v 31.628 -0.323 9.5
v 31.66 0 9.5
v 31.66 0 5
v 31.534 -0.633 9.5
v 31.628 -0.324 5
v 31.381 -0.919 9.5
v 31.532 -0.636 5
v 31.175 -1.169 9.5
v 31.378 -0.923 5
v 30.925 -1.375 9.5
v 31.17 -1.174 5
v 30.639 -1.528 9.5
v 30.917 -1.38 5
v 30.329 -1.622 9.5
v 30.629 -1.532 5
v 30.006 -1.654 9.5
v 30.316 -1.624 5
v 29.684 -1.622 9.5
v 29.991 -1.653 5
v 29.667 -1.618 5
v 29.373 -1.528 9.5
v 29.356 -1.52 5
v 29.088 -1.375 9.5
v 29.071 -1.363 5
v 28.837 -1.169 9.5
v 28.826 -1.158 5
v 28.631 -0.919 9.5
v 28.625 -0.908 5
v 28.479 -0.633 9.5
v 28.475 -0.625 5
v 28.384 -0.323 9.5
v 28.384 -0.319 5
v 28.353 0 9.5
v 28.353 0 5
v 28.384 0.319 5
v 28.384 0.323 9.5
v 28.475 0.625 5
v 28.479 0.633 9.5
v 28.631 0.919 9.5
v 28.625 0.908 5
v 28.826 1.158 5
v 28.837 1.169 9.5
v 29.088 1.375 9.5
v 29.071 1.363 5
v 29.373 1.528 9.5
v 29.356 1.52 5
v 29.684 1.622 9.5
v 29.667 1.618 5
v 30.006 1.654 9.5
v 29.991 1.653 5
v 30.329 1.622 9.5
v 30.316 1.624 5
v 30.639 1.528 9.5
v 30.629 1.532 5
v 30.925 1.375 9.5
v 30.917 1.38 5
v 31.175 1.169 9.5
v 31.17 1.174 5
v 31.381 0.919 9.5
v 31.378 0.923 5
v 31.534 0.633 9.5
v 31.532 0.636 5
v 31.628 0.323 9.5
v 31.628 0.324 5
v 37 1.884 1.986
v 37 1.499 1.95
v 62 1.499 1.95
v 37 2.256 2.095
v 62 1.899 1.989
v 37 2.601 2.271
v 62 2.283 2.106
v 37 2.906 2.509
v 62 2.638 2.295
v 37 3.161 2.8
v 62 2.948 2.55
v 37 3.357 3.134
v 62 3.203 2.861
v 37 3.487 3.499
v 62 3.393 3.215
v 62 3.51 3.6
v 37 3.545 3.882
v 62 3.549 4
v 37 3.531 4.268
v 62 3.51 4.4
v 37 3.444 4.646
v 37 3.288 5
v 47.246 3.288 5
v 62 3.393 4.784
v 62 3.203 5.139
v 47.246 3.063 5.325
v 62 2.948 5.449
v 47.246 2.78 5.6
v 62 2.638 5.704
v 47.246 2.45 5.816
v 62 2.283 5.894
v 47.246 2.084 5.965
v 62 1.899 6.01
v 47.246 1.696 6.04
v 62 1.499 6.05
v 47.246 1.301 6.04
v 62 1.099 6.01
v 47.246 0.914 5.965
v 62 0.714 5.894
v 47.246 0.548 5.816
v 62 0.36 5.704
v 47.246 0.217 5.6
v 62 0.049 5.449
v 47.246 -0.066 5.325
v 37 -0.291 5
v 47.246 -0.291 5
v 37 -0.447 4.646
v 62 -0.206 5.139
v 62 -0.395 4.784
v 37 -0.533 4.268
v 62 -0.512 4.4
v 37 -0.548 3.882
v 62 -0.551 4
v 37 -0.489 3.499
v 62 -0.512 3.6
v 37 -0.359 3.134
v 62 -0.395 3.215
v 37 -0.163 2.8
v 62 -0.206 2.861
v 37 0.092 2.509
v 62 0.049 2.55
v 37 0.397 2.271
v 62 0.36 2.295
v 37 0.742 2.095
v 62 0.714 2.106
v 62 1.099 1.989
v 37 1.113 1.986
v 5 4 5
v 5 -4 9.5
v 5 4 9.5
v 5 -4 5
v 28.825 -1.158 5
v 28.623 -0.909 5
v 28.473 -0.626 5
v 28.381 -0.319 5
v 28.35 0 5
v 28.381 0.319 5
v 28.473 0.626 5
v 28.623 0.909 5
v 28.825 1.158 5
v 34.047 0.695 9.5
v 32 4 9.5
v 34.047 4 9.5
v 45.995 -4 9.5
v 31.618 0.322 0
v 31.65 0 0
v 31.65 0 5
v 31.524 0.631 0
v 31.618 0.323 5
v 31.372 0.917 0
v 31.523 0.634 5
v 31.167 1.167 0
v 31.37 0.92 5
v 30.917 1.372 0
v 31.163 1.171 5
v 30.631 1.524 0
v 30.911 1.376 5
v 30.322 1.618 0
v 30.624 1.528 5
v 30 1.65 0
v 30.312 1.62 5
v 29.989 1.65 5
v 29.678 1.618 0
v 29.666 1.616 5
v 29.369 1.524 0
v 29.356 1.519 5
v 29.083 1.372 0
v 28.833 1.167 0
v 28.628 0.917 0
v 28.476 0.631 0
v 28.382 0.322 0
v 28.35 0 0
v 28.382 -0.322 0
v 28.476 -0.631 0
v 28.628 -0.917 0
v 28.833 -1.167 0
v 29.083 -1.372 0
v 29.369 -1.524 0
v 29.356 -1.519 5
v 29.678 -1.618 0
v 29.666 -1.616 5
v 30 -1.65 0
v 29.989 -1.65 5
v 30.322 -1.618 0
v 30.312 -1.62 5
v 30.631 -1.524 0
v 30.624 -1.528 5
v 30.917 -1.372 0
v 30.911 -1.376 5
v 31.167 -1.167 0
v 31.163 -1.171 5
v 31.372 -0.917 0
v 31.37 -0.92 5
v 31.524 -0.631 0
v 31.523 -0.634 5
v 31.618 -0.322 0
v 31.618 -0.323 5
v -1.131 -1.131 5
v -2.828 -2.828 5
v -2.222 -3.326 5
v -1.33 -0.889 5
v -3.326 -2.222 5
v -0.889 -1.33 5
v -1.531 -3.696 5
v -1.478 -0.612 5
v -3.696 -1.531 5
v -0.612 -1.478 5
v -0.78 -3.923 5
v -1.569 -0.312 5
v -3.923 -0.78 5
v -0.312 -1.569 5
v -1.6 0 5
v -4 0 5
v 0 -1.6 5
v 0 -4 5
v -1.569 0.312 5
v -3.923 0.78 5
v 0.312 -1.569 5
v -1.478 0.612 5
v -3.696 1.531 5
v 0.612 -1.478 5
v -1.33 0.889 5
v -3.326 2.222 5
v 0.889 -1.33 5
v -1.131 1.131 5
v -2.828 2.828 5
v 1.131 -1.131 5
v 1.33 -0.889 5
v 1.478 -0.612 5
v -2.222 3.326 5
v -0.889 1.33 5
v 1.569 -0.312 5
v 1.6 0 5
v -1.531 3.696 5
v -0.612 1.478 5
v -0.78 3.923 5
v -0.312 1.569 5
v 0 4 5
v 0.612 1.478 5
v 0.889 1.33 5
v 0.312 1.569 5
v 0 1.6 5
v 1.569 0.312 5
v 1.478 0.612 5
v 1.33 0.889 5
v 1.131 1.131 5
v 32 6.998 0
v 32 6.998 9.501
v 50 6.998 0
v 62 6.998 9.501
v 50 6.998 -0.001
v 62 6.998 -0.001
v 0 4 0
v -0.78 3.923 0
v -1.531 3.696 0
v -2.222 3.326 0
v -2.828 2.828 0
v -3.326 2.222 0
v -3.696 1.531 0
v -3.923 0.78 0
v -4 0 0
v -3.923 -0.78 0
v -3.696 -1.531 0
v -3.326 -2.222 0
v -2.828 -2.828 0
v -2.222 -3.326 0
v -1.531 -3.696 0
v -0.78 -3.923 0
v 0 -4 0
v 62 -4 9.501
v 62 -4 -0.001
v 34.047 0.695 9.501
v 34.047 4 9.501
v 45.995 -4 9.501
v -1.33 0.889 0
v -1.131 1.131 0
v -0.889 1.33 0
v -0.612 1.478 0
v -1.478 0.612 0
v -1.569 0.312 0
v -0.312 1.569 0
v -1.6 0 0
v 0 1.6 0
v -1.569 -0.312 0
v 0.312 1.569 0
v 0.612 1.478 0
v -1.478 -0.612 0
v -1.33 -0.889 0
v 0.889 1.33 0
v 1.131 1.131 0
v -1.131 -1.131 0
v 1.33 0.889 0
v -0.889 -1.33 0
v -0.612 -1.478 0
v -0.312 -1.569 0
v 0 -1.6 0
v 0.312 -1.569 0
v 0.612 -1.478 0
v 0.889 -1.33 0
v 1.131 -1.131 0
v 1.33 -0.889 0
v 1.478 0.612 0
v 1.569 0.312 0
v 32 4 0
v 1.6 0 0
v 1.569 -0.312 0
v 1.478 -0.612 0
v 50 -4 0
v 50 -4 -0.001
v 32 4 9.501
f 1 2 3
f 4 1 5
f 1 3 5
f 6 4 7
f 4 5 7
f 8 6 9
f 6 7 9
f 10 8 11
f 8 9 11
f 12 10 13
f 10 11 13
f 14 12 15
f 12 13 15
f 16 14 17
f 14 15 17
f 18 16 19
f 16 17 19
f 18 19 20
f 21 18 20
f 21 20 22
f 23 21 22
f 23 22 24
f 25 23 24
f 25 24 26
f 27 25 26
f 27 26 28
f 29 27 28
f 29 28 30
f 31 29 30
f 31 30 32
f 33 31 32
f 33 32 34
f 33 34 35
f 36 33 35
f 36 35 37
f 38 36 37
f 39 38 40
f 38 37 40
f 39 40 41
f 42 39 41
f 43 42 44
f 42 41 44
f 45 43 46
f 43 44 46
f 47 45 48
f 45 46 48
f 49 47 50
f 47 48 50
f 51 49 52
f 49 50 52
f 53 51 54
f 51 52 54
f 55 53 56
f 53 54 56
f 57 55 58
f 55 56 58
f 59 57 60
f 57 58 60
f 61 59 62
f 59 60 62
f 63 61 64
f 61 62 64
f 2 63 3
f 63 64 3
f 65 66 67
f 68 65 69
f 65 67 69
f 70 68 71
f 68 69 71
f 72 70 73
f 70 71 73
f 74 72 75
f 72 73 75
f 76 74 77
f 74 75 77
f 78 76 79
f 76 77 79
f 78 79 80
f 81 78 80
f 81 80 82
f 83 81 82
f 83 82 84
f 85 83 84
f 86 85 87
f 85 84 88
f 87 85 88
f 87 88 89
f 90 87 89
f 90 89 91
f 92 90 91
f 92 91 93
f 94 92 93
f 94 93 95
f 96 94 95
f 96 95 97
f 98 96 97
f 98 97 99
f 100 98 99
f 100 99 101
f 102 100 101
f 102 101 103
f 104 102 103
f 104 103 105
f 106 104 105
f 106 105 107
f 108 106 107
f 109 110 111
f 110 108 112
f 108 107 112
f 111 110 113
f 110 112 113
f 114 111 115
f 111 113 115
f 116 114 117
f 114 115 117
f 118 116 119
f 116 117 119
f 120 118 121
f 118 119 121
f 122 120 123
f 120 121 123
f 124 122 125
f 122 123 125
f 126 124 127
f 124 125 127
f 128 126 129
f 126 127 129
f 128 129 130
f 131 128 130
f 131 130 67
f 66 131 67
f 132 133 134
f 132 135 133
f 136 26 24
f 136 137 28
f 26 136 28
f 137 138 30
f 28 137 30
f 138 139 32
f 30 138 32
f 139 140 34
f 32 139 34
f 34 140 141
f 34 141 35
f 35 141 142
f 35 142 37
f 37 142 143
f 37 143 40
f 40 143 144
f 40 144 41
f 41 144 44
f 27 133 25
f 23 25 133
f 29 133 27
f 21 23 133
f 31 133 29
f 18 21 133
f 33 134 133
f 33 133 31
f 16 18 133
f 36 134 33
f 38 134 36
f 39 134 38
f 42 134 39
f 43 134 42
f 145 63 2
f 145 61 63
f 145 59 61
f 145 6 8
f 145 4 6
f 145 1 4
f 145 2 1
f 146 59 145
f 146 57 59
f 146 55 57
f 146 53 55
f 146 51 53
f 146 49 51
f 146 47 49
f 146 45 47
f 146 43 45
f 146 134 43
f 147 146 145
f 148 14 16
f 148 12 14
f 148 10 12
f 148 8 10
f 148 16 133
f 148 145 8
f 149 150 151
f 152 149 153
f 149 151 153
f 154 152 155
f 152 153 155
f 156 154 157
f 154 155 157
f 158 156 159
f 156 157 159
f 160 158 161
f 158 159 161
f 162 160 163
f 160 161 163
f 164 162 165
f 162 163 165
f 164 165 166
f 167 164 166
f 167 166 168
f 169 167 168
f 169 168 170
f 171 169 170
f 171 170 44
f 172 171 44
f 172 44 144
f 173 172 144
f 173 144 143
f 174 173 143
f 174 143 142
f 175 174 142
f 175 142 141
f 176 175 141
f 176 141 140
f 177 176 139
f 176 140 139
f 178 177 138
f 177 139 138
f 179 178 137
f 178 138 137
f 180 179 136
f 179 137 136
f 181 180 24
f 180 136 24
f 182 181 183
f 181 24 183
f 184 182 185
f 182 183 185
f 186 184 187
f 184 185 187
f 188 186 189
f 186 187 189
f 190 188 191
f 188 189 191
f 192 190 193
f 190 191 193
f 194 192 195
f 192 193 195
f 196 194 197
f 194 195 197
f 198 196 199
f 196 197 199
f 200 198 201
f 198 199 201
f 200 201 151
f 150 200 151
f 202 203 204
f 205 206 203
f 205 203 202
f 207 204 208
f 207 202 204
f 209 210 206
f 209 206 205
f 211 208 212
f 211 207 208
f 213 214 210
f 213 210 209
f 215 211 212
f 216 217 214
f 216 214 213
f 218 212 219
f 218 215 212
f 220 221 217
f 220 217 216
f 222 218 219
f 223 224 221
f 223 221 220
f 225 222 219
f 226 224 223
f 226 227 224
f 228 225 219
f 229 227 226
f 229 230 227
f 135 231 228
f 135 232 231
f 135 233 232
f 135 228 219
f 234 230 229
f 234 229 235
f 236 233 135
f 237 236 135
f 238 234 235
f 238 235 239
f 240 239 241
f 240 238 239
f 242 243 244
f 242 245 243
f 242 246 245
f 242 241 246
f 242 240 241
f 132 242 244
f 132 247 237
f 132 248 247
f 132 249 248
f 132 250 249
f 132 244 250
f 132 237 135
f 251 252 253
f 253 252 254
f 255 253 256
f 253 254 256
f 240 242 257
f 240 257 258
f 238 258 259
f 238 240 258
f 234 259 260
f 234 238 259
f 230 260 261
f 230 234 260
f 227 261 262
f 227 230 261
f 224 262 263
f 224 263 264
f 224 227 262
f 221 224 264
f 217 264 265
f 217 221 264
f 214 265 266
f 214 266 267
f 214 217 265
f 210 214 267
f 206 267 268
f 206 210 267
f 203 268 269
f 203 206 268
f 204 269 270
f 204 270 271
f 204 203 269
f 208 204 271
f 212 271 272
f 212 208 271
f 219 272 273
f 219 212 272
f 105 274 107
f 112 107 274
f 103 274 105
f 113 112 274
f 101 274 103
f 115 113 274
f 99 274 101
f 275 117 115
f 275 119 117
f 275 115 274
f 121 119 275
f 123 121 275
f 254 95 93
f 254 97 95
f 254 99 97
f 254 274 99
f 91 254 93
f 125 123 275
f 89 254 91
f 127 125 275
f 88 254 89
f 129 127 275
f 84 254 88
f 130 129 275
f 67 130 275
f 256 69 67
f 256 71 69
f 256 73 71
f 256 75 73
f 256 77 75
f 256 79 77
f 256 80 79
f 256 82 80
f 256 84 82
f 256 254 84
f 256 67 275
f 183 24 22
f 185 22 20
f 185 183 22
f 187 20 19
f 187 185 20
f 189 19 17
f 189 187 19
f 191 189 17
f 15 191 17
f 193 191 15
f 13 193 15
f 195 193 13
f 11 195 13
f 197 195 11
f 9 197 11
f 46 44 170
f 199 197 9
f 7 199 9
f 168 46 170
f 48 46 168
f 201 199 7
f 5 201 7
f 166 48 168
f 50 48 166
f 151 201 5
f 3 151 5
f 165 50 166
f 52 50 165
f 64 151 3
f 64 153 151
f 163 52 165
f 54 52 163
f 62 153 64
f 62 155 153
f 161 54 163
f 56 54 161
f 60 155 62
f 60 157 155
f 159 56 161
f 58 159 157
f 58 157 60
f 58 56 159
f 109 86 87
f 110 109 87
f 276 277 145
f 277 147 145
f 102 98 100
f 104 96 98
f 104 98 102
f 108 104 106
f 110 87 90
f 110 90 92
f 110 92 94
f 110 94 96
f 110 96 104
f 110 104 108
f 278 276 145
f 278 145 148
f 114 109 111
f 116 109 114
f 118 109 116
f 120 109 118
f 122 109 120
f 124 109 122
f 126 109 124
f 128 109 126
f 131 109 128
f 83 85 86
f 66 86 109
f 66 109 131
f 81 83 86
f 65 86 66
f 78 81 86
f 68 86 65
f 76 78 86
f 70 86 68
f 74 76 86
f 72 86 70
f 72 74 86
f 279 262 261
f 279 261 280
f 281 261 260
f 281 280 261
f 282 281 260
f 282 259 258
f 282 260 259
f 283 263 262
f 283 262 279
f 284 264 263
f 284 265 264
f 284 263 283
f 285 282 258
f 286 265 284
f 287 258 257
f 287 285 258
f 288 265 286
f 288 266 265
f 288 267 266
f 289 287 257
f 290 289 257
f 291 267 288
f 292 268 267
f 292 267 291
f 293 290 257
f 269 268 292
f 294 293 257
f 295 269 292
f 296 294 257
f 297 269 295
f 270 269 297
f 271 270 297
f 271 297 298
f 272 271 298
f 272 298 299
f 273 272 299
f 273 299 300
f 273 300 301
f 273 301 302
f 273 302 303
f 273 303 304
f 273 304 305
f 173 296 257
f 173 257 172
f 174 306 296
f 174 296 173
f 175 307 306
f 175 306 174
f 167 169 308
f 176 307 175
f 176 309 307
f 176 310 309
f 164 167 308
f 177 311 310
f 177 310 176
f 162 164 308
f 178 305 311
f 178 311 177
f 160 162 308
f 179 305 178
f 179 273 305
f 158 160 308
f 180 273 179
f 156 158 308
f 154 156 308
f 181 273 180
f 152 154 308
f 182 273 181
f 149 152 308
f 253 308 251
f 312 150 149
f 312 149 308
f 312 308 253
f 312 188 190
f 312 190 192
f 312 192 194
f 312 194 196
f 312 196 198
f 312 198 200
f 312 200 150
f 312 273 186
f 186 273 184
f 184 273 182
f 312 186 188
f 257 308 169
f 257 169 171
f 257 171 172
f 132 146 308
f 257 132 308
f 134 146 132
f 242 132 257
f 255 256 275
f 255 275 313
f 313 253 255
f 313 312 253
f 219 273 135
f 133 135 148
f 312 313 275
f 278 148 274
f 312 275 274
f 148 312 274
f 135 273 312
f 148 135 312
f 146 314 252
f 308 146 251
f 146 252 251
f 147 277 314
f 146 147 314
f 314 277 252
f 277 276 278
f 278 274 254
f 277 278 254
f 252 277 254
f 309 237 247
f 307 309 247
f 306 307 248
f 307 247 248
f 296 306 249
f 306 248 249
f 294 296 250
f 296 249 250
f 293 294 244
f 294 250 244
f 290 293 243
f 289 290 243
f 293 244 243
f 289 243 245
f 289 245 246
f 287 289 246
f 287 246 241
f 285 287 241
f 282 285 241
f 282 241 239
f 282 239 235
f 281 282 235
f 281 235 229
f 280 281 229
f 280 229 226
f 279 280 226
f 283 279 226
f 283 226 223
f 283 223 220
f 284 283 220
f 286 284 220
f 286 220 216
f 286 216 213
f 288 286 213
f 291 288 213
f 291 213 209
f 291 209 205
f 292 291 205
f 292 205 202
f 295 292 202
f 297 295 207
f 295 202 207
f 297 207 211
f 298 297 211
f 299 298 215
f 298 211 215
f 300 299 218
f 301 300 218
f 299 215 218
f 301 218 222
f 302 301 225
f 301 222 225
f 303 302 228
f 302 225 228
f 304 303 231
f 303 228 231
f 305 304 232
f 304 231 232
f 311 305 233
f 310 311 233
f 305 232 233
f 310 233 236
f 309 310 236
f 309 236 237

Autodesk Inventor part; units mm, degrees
ref_plane "YZ Plane" through (0, 0, 0) normal (1, 0, 0) x (0, 1, 0)
ref_plane "XZ Plane" through (0, 0, 0) normal (0, 1, 0) x (-1, 0, 0)
ref_plane "XY Plane" through (0, 0, 0) normal (0, 0, 1) x (1, 0, 0)
sketch "Sketch1" plane through (0, 0, 0) normal (0, 0, 1) x (1, 0, 0)
  line L0 (0, 0) -> (54, 0)
  circle A0 centre (0, 0) radius 1.55
  line L1 (0, 0) -> (10.0334, 0) construction
  line L2 (0, -2.5) -> (10.0334, -2.5)
  line L3 (10.0334, 2.5) -> (0, 2.5)
  arc A1 (0, 2.5) -> (0, -2.5) centre (0, 0) ccw
  arc A2 (10.0334, -2.5) -> (10.0334, 2.5) centre (10.0334, 0) ccw
  line L4 (0, 0) -> (54, 0) construction
  line L5 (0, -2.5) -> (54, -2.5)
  line L6 (54, 2.5) -> (0, 2.5)
  arc A3 (0, 2.5) -> (0, -2.5) centre (0, 0) ccw
  arc A4 (54, -2.5) -> (54, 2.5) centre (54, 0) ccw
  line L7 (54, 2.5) -> (54, -2.5)
  point P0 (5.0167, 0)
  point P1 (27, 0)
  dimension "d0" = 54
  dimension "d1" = 3.1
  dimension "d2" = 5
  dimension "d3" = 5
extrude "Extrusion1" add sketch "Sketch1" along normal blind 5 contours A2 L6 L7 L0 | L0 L7 L5 A2 | A2 L2 A1 L3
sketch "Sketch2" plane through (0, 0, 5) normal (0, 0, 1) x (1, 0, 0)
  point P0 (0, 0)
sketch "Sketch3" plane through (0, 0, 5) normal (0, 0, 1) x (1, 0, 0)
  circle A0 centre (20.0365, 0) radius 1.5
  point P0 (0, 0)
  dimension "d7" = 3
extrude "Extrusion2" cut sketch "Sketch3" against normal blind 5
sketch "Sketch4" plane through (0, 0, 5) normal (0, 0, 1) x (1, 0, 0)
  circle A0 centre (0, 0) radius 1.6
  circle A1 centre (20.0364, 0) radius 1.6
  dimension "d10" = 3.2
  dimension "d11" = 3.2
extrude "Extrusion3" cut sketch "Sketch4" against normal blind 5
sketch "Sketch5" plane through (0, 0, 5) normal (0, 0, 1) x (1, 0, 0)
  circle A0 centre (20.0364, 0) radius 1.6 projected
  circle A1 centre (20.0364, 0) radius 1.6
  line L0 (0, 0) -> (24, 0)
  circle A2 centre (24, 0) radius 1.65
  dimension "d14" = 3.2
  dimension "d15" = 24
  dimension "d16" = 3.3
extrude "Extrusion4" cut sketch "Sketch5" against normal blind 5 contours A2
extrude "Extrusion5" add sketch "Sketch5" against normal blind 5 contours L0 A0 | A0 L0
sketch "Sketch6" plane through (0, 0, 5) normal (0, 0, 1) x (1, 0, 0)
  line L0 (0, 0) -> (32, 0)
  line L1 (54, 2.5) -> (0, 2.5) projected
  line L2 (0, -2.5) -> (54, -2.5) projected
  line L3 (32, 2.5) -> (54, 2.5)
  line L4 (54, 2.5) -> (54, -2.5)
  line L5 (54, -2.5) -> (32, -2.5)
  line L6 (32, -2.5) -> (32, 2.5)
  dimension "d21" = 32
extrude "Extrusion6" add sketch "Sketch6" along normal blind 3
sketch "Sketch7" plane through (0, 2.5, 0) normal (0, 1, 0) x (1, 0, 0)
  line L0 (32, -8) -> (54, -8) projected
  line L1 (32, -8) -> (54, -8)
  line L2 (54, -8) -> (54, 0)
  line L3 (54, 0) -> (32, 0)
  line L4 (32, 0) -> (32, -8)
  point P0 (0, 0)
extrude "Extrusion7" add sketch "Sketch7" along normal blind 3
sketch "Sketch8" plane through (54, -2.5, 8) normal (1, 0, 0) x (0, 0, -1)
  line L0 (3, 0) -> (0, 0) projected
  line L1 (8, 5) -> (8, 8) projected
  line L2 (0, 0) -> (8, 0)
  line L3 (8, 0) -> (8, 8)
  line L4 (8, 8) -> (0, 8)
  line L5 (0, 8) -> (0, 0)
  point P0 (8, 2.5)
extrude "Extrusion8" add sketch "Sketch8" along normal blind 8
sketch "Sketch9" plane through (62, -2.5, 8) normal (1, 0, 0) x (0, 0, -1)
  circle A0 centre (4.0002, 3.9989) radius 2.05
  point P0 (8, 2.5)
  dimension "d28" = 4.1
extrude "Extrusion9" cut sketch "Sketch9" against normal blind 25
sketch "Sketch10" plane through (0, 0, 5) normal (0, 0, 1) x (1, 0, 0)
  point P0 (0, 0)
sketch "Sketch11" plane through (0, 0, 5) normal (0, 0, 1) x (1, 0, 0)
  circle A0 centre (0, 0) radius 1.6 projected
  circle A1 centre (0, 0) radius 1.65
  circle A2 centre (24.0003, 0) radius 1.65
  line L0 (0, 0) -> (32.9469, 0) construction
  line L1 (0, -4) -> (32.9469, -4)
  line L2 (32.9469, 4) -> (0, 4)
  arc A3 (0, 4) -> (0, -4) centre (0, 0) ccw
  arc A4 (32.9469, -4) -> (32.9469, 4) centre (32.9469, 0) ccw
  point P0 (16.4734, 0)
  dimension "d31" = 3.3
  dimension "d32" = 3.3
  dimension "d33" = 8
extrude "Extrusion10" add sketch "Sketch11" against normal blind 5 contours A3 L2 A4 L1
sketch "Sketch12" plane through (62, -2.5, 8) normal (1, 0, 0) x (0, 0, -1)
  line L0 (-1.5007, 9.4978) -> (9.5011, 9.4978)
  line L1 (9.5011, 9.4978) -> (9.5011, -1.5)
  line L2 (9.5011, -1.5) -> (-1.5007, -1.5)
  line L3 (-1.5007, -1.5) -> (-1.5007, 9.4978)
  circle A0 centre (4.0002, 3.9989) radius 2.05 projected
  line L4 (-1.5007, 9.4978) -> (9.5011, -1.5) construction
  line L5 (9.5011, 9.4978) -> (-1.5007, -1.5) construction
  circle A1 centre (4.0002, 3.9989) radius 2.05
  point P0 (8, 2.5)
extrude "Extrusion11" add sketch "Sketch12" against normal blind 30
sketch "Sketch13" plane through (0, -4, 5) normal (0, -1, 0) x (1, 0, 0)
  line L0 (32, -5) -> (32, 0) projected
  line L1 (62, -6.5011) -> (32, -6.5011) projected
  line L2 (32, -5) -> (50, -5)
  line L3 (50, -5) -> (50, -6.5011)
  line L4 (50, -6.5011) -> (32, -6.5011)
  line L5 (32, -6.5011) -> (32, -5)
  point P0 (0, -5)
  dimension "d38" = 18
extrude "Extrusion12" cut sketch "Sketch13" against normal blind 30
sketch "Sketch14" plane through (62, -4, 9.5007) normal (0, 0, 1) x (1, 0, 0)
  line L0 (-30, 0) -> (-30, 10.9978) projected
  line L1 (0, 0) -> (-30, 0) projected
  line L2 (-30, 5.4989) -> (-16.0053, 0)
  line L3 (-16.0053, 0) -> (-19.5106, -8.9209)
  line L4 (-19.5106, -8.9209) -> (-33.5053, -3.422)
  line L5 (-33.5053, -3.422) -> (-30, 5.4989)
  point P0 (-62, 4)
extrude "Extrusion13" cut sketch "Sketch14" against normal blind 4.5
sketch "Sketch15" plane through (0, 0, 5) normal (0, 0, 1) x (1, 0, 0)
  line L0 (0, 0) -> (30, 0)
  line L1 (32, -4) -> (32, 1.4989) projected
  circle A0 centre (30, 0) radius 1.65
  line L2 (34.0466, 0) -> (31.65, 0)
  line L3 (31.65, 0) -> (31.65, 4.2484)
  line L4 (31.65, 4.2484) -> (34.0466, 4.2484)
  line L5 (34.0466, 4.2484) -> (34.0466, 0)
  dimension "d43" = 30
  dimension "d44" = 3.3
extrude "Extrusion14" cut sketch "Sketch15" against normal blind 10 contours A0
extrude "Extrusion15" cut sketch "Sketch15" along normal blind 10 contours L3 L4 L5 L2
sketch "Sketch16" plane through (0, 0, 5) normal (0, 0, 1) x (1, 0, 0)
  circle A0 centre (24.0277, 0) radius 2.9708
  point P0 (0, 0)
extrude "Extrusion16" add sketch "Sketch16" against normal blind 5
sketch "Sketch17" plane through (62, -4, -1.5011) normal (0, 0, -1) x (-1, 0, 0)
  line L0 (-2.625, 12.9039) -> (17.8252, 12.9039)
  line L1 (17.8252, 12.9039) -> (17.8252, -5.3634)
  line L2 (17.8252, -5.3634) -> (-2.625, -5.3634)
  line L3 (-2.625, -5.3634) -> (-2.625, 12.9039)
  point P0 (62, 4)
extrude "Extrusion17" cut sketch "Sketch17" against normal blind 1.5
sketch "Sketch18" plane through (0, 0, 5) normal (0, 0, 1) x (1, 0, 0)
  circle A0 centre (0, 0) radius 1.6 projected
  line L0 (0, 0) -> (5, 0)
  line L1 (5, 0) -> (47.2457, 0)
  line L2 (47.2457, 0) -> (47.2457, -3.9214)
  line L3 (47.2457, -3.9214) -> (5, -3.9214)
  line L4 (5, -3.9214) -> (5, 0)
  line L5 (32, 4) -> (0, 4) projected
  line L6 (5, 4) -> (47.2457, 4)
  line L7 (47.2457, 4) -> (47.2457, -3.9214)
  line L8 (47.2457, -3.9214) -> (5, -3.9214)
  line L9 (5, -3.9214) -> (5, 4)
  circle A1 centre (30.0062, 0) radius 1.6535
  dimension "d53" = 5
extrude "Extrusion18" add sketch "Sketch18" along normal blind 4.5 contours A1 L1 L9 L5 L6 L7 | L1 L2 L3 L4 A1
sketch "Sketch19" plane through (5, -3.9214, 5) normal (0, -1, 0) x (1, 0, 0)
  point P0 (-5, -5)
sketch "Sketch20" plane through (0, 0, 5) normal (0, 0, 1) x (1, 0, 0)
  line L0 (5, -3.9214) -> (5, 4) projected
  line L1 (50, -4) -> (0, -4) projected
  line L2 (5, -2.1351) -> (48.5972, -2.1351)
  line L3 (48.5972, -2.1351) -> (48.5972, -4)
  line L4 (48.5972, -4) -> (5, -4)
  line L5 (5, -4) -> (5, -2.1351)
  point P0 (0, 0)
extrude "Extrusion19" add sketch "Sketch20" along normal blind 4.5
sketch "Sketch21" plane through (62, -4, 9.5007) normal (0, 0, 1) x (1, 0, 0)
  line L0 (-30, 8.2484) -> (-27.9534, 8.2484) projected
  line L1 (-27.9534, 8) -> (-57, 8) projected
  line L2 (-30, 8.2484) -> (-27.9534, 8.2484)
  line L3 (-27.9534, 8.2484) -> (-27.9534, 8)
  line L4 (-27.9534, 8) -> (-30, 8)
  line L5 (-30, 8) -> (-30, 8.2484)
  point P0 (-62, 4)
extrude "Extrusion20" add sketch "Sketch21" against normal blind 8
properties part number "arm"
